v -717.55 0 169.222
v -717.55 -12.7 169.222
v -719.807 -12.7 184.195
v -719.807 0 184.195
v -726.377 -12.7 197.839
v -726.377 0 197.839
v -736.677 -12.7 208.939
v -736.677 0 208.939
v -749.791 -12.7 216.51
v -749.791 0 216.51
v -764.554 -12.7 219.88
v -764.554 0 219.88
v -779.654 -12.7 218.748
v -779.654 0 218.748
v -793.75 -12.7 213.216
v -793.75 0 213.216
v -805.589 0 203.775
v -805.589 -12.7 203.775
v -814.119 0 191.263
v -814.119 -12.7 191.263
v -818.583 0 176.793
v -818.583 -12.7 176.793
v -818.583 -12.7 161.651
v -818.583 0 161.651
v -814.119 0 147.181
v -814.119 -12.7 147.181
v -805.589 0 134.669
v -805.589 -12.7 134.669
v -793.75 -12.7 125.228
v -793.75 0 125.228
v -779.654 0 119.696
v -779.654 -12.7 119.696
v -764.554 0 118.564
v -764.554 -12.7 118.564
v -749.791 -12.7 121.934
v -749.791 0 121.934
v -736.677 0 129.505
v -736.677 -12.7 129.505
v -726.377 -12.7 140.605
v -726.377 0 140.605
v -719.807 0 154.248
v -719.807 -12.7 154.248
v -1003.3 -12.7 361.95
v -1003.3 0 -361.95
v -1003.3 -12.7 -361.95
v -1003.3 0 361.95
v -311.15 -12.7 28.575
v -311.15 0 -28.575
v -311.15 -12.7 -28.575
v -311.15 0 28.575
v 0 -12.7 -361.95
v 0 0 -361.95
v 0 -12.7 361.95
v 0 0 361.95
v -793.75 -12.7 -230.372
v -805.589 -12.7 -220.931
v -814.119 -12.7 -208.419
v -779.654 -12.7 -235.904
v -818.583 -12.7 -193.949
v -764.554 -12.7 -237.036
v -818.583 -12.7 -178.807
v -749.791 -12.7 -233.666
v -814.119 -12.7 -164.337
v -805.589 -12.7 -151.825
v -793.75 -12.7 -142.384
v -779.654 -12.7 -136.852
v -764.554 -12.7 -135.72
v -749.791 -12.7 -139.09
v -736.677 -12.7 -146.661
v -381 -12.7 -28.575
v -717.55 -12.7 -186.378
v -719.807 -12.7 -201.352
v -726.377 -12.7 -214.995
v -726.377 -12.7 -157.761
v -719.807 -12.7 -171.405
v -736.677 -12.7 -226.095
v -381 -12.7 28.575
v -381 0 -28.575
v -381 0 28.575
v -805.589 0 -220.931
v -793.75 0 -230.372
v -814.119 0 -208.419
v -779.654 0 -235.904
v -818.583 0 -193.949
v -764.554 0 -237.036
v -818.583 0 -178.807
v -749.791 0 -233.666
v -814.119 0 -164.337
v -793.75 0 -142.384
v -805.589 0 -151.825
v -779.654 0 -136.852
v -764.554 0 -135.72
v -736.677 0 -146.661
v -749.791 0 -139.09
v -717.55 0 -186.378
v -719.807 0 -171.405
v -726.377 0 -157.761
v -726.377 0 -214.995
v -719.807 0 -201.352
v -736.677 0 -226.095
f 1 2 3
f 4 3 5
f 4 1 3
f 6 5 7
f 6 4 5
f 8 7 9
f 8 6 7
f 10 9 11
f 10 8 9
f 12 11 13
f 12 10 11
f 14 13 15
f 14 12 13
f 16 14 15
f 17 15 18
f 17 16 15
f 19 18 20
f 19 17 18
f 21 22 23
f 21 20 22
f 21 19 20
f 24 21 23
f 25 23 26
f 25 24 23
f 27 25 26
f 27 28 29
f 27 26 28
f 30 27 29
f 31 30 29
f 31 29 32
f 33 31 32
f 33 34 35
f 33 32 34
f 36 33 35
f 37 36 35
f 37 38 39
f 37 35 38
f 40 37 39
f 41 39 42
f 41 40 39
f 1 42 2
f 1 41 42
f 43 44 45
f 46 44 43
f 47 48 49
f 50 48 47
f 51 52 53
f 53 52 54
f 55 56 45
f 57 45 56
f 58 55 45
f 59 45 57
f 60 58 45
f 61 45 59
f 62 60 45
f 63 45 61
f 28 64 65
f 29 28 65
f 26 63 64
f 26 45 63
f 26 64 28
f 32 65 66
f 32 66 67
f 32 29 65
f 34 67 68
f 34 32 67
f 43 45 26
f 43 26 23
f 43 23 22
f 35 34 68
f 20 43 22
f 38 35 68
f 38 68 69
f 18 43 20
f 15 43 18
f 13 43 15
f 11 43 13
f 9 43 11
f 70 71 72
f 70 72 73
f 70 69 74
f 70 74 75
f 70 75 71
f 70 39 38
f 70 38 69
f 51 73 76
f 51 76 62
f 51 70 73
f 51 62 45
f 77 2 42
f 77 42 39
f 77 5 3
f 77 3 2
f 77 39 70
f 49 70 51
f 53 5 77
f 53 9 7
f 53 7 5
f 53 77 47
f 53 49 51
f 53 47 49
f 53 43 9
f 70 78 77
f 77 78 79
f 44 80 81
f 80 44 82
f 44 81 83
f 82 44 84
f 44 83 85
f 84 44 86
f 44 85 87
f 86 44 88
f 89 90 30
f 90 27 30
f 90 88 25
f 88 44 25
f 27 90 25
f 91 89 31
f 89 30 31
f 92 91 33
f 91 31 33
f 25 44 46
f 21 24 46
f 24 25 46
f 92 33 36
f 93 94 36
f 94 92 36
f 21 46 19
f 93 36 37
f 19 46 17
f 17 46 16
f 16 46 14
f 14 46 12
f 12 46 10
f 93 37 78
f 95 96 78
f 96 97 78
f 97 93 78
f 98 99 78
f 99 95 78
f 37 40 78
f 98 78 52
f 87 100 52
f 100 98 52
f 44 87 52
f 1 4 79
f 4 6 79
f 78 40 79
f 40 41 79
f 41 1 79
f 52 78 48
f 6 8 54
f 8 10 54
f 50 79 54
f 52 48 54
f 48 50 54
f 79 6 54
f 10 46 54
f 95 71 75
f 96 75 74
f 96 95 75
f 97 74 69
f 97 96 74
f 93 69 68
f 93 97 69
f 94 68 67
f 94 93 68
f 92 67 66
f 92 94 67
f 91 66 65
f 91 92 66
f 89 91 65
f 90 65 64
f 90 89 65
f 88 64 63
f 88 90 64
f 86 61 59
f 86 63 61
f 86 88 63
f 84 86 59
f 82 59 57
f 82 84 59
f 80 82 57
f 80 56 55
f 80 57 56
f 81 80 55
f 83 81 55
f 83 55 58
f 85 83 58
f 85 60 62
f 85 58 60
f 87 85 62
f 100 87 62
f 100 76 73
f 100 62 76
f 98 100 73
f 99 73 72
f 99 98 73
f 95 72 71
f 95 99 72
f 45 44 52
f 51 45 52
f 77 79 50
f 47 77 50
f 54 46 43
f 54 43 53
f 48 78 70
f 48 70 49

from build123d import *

# Parameters (mm, degrees)
F0_W     = 1003.3
F0_H     = 723.9
F1_DEPTH = 12.7
F2_W     = 69.85
F2_H     = 57.15
F3_DEPTH = 12.701
F4_R     = 50.8
F5_DEPTH = 12.701


with BuildPart() as f1:
    # F0 (on Front) → F1 (new body)
    with BuildSketch(Plane.XZ):
        with Locations((-501.65, 0)):
            Rectangle(F0_W, F0_H)
    extrude(amount=F1_DEPTH)

    # F2 (on Front) → F3 (cut, through all)
    with BuildSketch(Plane.XZ):
        with Locations((-346.075, 0)):
            Rectangle(F2_W, F2_H)
    extrude(amount=F3_DEPTH, mode=Mode.SUBTRACT)

    # F4 (on Front) → F5 (cut, through all)
    with BuildSketch(Plane.XZ):
        with Locations((-768.35, 169.221888)):
            Circle(F4_R)
        with Locations((-768.35, -186.378112)):
            Circle(F4_R)
    extrude(amount=F5_DEPTH, mode=Mode.SUBTRACT)


solid = f1.part
